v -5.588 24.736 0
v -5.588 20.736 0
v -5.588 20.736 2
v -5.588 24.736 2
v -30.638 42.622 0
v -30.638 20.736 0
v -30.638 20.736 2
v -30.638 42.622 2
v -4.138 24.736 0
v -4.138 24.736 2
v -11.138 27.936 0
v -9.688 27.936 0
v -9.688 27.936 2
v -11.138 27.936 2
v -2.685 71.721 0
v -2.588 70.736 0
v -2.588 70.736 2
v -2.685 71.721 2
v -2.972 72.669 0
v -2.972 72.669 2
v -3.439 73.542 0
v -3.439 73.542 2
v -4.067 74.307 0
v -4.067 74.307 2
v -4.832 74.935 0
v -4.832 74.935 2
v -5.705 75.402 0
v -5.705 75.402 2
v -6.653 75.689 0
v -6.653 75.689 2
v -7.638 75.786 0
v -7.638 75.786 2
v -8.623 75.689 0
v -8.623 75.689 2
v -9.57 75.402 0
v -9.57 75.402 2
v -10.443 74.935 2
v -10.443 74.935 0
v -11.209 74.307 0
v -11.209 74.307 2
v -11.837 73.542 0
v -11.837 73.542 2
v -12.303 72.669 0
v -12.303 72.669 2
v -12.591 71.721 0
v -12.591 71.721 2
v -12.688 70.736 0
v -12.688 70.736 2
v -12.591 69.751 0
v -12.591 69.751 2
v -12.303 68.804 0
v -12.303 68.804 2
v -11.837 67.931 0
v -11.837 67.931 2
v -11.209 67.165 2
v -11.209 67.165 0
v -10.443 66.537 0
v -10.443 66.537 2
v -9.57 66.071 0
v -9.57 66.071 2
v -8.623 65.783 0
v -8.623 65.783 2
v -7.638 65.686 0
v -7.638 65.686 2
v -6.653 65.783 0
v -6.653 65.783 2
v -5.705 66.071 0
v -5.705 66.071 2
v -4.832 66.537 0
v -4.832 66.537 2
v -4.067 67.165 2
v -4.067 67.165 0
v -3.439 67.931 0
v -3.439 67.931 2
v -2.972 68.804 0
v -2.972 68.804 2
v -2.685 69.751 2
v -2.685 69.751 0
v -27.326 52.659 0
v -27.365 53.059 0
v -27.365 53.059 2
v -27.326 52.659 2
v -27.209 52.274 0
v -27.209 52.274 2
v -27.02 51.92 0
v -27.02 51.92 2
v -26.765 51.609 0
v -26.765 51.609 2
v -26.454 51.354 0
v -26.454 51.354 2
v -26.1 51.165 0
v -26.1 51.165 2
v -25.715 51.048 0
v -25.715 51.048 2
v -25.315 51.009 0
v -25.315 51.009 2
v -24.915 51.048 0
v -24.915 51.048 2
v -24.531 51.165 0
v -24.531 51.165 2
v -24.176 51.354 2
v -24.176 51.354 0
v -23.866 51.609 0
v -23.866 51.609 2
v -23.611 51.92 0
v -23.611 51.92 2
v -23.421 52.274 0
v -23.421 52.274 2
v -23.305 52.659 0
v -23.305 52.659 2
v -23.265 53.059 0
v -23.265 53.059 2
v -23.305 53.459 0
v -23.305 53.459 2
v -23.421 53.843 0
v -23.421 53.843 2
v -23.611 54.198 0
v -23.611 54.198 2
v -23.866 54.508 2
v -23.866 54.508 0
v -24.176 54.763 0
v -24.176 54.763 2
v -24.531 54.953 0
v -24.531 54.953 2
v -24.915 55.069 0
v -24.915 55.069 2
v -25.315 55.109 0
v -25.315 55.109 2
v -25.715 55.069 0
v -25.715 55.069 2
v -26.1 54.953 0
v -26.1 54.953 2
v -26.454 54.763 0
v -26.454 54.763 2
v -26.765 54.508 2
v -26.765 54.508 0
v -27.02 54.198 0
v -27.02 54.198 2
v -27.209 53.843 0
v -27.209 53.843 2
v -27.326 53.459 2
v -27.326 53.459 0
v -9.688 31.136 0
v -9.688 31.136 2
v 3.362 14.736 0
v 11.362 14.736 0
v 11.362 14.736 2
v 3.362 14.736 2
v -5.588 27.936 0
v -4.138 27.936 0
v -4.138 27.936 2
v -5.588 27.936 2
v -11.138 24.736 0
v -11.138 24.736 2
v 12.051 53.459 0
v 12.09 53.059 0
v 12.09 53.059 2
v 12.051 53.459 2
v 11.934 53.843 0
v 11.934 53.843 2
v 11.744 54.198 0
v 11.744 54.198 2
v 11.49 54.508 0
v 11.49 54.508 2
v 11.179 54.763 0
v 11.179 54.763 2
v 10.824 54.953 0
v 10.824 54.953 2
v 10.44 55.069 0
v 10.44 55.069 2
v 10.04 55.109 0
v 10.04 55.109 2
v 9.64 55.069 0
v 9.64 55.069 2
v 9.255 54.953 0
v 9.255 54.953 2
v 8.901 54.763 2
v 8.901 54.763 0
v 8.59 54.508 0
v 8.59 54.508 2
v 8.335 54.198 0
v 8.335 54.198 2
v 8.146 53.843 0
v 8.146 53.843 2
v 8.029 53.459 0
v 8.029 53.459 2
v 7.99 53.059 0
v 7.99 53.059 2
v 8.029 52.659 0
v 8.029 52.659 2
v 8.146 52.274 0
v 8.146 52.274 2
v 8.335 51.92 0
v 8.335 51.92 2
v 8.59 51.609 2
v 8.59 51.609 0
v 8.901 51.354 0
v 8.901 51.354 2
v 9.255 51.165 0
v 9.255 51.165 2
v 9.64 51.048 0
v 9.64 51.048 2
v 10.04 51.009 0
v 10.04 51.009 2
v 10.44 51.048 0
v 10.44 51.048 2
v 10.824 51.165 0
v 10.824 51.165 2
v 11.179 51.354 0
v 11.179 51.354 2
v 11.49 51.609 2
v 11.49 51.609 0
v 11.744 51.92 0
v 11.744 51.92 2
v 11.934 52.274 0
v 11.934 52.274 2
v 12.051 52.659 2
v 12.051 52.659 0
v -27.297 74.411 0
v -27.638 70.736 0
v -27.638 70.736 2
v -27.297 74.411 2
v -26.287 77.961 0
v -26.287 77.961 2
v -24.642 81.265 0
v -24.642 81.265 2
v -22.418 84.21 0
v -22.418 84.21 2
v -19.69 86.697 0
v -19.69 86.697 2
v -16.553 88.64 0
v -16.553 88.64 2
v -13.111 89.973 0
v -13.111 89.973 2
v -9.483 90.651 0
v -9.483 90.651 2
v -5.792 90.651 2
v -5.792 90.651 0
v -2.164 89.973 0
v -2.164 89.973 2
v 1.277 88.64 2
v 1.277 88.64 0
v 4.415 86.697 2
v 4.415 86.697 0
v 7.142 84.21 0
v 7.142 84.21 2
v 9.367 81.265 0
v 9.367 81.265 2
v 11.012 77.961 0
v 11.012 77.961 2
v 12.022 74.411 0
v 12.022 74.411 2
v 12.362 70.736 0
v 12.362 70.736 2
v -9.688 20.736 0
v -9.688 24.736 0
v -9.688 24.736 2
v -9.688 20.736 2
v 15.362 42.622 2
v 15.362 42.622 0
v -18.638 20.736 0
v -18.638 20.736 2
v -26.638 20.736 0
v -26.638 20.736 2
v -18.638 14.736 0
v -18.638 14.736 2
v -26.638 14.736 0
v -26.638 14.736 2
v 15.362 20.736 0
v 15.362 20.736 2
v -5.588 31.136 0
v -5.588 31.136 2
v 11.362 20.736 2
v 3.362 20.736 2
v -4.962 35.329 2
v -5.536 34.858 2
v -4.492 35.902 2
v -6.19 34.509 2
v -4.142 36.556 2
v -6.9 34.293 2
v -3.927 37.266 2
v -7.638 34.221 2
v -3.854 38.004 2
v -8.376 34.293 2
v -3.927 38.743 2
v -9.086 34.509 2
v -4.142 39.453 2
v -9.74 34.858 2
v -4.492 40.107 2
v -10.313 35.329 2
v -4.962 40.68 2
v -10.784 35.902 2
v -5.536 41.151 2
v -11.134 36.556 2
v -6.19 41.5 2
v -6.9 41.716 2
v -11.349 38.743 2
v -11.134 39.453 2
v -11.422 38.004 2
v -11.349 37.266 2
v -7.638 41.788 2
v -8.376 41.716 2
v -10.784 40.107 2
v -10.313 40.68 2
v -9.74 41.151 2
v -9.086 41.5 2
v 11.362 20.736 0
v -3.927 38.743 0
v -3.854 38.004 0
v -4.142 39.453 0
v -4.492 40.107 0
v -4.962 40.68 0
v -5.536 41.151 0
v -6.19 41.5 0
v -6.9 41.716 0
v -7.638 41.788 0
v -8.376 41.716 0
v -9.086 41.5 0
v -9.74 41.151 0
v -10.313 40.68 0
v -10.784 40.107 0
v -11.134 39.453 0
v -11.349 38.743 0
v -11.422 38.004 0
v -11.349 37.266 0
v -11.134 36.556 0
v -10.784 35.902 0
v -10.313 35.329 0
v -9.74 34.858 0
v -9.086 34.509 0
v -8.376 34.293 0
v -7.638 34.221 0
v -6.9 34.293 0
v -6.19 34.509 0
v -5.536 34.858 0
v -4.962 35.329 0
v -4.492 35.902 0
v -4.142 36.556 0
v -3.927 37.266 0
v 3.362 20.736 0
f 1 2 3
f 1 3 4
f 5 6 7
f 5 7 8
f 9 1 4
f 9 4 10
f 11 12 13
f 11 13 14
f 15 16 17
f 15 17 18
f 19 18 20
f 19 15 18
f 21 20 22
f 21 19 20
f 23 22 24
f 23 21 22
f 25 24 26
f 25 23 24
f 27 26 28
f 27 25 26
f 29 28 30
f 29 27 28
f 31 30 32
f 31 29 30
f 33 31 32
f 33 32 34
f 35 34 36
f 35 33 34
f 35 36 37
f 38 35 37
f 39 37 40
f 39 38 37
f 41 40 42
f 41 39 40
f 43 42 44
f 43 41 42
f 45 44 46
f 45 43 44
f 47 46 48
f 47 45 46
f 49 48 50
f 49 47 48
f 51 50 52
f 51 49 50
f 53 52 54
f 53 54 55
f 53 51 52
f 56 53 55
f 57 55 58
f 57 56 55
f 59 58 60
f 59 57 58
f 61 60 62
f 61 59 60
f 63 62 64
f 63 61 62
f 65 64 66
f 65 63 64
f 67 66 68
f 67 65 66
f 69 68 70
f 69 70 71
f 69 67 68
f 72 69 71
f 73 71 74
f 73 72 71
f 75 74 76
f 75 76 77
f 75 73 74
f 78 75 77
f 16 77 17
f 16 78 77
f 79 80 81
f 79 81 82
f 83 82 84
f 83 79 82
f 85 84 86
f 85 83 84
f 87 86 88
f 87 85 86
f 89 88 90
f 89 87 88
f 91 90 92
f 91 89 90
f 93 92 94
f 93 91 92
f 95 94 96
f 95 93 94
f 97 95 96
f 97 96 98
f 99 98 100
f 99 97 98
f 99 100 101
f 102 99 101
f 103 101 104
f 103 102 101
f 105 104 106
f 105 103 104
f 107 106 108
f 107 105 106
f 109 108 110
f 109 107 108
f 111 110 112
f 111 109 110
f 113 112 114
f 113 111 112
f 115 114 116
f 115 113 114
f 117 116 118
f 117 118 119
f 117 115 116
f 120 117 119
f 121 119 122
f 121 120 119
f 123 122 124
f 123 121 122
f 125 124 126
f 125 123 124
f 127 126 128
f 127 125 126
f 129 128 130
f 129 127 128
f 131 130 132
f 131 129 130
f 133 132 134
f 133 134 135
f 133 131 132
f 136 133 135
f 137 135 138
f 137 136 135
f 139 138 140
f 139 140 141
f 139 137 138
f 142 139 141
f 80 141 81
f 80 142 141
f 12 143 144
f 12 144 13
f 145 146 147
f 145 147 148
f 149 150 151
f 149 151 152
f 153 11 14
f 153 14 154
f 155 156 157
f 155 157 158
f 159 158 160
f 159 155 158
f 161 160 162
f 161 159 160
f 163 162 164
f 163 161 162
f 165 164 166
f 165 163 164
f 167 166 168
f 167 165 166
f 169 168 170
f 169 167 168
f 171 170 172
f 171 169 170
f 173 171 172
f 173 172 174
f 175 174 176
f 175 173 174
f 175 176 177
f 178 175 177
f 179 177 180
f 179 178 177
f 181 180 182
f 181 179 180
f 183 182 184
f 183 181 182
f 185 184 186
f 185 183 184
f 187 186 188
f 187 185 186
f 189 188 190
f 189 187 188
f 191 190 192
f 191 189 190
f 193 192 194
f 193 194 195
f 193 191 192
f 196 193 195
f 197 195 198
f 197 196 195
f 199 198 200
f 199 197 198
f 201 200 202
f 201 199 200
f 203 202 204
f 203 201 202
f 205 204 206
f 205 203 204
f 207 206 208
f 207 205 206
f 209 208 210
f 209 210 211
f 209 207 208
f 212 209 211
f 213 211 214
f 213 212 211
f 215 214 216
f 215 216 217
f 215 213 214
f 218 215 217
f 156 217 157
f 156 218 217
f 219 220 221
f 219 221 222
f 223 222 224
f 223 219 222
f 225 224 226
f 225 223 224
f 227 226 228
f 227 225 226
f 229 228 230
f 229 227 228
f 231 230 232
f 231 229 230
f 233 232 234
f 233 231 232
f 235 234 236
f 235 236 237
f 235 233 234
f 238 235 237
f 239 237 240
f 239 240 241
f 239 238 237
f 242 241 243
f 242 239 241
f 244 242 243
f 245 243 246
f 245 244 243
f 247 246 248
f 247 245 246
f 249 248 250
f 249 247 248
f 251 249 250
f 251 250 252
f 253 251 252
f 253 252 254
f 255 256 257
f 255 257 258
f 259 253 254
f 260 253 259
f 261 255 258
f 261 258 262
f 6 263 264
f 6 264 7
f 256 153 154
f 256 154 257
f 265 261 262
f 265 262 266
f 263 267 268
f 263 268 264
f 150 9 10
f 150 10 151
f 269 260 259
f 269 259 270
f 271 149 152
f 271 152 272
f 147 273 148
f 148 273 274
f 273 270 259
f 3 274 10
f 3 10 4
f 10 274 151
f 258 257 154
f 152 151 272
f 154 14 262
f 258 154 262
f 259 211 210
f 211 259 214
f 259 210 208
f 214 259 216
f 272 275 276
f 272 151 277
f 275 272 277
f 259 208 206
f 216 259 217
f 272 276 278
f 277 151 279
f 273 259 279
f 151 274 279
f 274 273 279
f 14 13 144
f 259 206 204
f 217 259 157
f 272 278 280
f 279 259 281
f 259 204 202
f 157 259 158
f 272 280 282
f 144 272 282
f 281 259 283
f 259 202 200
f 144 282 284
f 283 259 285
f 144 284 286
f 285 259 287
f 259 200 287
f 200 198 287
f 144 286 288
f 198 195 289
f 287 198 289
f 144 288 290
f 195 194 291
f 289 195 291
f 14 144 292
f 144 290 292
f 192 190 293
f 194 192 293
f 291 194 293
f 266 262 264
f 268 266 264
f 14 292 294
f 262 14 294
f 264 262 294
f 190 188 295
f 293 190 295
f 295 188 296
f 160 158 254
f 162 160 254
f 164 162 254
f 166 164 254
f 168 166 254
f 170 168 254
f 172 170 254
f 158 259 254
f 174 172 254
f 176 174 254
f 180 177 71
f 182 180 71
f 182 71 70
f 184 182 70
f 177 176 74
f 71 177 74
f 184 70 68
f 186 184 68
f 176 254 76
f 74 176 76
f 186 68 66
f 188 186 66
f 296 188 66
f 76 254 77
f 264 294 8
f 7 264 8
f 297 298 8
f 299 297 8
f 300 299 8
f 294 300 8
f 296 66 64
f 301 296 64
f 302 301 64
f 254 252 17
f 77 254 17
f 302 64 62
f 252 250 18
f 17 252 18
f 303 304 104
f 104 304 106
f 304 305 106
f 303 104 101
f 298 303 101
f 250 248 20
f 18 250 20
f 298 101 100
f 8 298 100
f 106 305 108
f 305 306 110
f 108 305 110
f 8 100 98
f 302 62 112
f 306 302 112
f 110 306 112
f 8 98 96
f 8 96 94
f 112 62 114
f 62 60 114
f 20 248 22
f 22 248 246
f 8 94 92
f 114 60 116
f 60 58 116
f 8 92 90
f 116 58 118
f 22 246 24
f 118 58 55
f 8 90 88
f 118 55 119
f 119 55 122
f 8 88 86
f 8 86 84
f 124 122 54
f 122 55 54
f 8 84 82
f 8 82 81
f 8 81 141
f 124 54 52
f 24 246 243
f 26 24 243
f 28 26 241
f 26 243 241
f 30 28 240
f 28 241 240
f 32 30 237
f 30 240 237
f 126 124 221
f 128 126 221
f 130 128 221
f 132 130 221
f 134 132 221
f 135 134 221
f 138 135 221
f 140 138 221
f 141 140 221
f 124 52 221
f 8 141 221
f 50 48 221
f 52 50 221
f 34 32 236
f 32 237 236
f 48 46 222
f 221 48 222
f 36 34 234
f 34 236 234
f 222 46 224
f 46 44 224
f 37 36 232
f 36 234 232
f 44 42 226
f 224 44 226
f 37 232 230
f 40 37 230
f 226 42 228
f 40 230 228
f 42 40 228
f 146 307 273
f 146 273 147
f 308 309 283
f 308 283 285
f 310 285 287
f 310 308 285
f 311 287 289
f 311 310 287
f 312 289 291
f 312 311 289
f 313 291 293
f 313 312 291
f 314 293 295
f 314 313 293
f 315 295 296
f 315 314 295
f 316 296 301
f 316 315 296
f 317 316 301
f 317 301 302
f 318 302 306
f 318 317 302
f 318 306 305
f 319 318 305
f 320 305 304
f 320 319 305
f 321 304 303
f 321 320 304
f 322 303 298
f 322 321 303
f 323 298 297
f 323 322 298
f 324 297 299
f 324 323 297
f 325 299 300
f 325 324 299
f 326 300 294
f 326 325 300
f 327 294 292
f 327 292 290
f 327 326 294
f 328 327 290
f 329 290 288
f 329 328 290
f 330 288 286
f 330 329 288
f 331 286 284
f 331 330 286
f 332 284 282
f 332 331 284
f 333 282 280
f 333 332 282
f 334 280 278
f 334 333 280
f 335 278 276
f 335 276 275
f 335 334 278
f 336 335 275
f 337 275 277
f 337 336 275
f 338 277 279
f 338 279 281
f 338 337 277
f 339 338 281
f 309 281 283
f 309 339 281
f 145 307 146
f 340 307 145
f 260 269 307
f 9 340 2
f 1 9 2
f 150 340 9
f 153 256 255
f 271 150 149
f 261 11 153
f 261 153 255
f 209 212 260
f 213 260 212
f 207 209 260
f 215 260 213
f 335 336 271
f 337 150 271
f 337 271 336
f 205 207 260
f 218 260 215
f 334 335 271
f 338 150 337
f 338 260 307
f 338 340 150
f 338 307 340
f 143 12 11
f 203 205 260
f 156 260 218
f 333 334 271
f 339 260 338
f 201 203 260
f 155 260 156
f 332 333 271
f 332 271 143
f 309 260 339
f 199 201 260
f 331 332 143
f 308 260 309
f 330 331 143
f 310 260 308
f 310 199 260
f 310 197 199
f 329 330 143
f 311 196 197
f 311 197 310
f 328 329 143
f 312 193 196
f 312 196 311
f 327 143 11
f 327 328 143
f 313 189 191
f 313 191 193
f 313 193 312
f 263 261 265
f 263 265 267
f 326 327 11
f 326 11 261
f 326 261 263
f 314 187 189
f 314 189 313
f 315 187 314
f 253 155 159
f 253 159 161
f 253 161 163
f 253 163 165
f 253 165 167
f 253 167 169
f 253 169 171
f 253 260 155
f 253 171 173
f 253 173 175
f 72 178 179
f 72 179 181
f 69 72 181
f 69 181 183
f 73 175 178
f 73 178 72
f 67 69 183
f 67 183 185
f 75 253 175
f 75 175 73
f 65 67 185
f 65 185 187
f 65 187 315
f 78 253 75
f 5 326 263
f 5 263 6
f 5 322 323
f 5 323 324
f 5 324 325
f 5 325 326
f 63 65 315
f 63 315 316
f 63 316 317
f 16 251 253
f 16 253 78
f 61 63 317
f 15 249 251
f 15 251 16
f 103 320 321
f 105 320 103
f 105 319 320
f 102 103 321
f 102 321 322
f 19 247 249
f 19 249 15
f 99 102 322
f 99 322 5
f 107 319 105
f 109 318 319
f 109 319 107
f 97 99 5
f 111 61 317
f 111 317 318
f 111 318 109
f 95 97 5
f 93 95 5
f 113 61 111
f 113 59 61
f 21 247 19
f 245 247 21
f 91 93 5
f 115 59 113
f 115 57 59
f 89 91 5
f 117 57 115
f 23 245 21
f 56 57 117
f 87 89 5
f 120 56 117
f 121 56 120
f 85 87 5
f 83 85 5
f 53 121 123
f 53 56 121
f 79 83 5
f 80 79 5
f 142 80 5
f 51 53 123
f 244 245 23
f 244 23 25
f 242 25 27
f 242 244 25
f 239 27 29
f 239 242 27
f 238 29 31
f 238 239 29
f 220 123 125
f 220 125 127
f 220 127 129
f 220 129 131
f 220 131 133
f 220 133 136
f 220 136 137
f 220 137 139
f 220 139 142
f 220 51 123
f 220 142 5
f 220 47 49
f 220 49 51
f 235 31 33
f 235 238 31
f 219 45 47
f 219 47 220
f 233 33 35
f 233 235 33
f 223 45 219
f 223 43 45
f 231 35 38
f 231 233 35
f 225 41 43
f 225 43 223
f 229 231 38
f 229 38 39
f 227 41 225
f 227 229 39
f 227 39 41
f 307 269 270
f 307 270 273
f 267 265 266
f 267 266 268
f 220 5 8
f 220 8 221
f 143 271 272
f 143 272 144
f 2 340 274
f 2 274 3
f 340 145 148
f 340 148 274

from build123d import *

# Parameters (mm, degrees)
SKETCH_1_R      = 5.05
SKETCH_1_R_2    = 2.05
SKETCH_1_R_3    = 3.783876232
EXTRUDE_1_DEPTH = 2


with BuildPart() as part:
    # 草图1 → 凸台-拉伸1 (new body)
    with BuildSketch(Plane.XY):
        with BuildLine():
            Line((-5.587732913, 20.736278596), (-5.587732913, 24.736278596))
            Line((-5.587732913, 24.736278596), (-4.137732913, 24.736278596))
            Line((-4.137732913, 24.736278596), (-4.137732913, 27.936278596))
            Line((-4.137732913, 27.936278596), (-5.587732913, 27.936278596))
            Line((-5.587732913, 27.936278596), (-5.587732913, 31.136278596))
            Line((-5.587732913, 31.136278596), (-9.687732913, 31.136278596))
            Line((-9.687732913, 31.136278596), (-9.687732913, 27.936278596))
            Line((-9.687732913, 27.936278596), (-11.137732913, 27.936278596))
            Line((-11.137732913, 27.936278596), (-11.137732913, 24.736278596))
            Line((-11.137732913, 24.736278596), (-9.687732913, 24.736278596))
            Line((-9.687732913, 24.736278596), (-9.687732913, 20.736278596))
            Line((-9.687732913, 20.736278596), (-18.637732913, 20.736278596))
            Line((-18.637732913, 20.736278596), (-18.637732913, 14.736278596))
            Line((-18.637732913, 14.736278596), (-26.637732913, 14.736278596))
            Line((-26.637732913, 14.736278596), (-26.637732913, 20.736278596))
            Line((-26.637732913, 20.736278596), (-30.637732913, 20.736278596))
            Line((-30.637732913, 20.736278596), (-30.637732913, 42.62233047))
            Line((-30.637732913, 42.62233047), (-27.637732913, 70.736278596))
            ThreePointArc((-27.637732913, 70.736278596), (-7.637732913, 90.736278596), (12.362267087, 70.736278596))
            Line((12.362267087, 70.736278596), (15.362267087, 42.62233047))
            Line((15.362267087, 42.62233047), (15.362267087, 20.736278596))
            Line((15.362267087, 20.736278596), (11.362267087, 20.736278596))
            Line((11.362267087, 20.736278596), (11.362267087, 14.736278596))
            Line((11.362267087, 14.736278596), (3.362267087, 14.736278596))
            Line((3.362267087, 14.736278596), (3.362267087, 20.736278596))
            Line((3.362267087, 20.736278596), (-5.587732913, 20.736278596))
        make_face()
        with Locations((-7.637732913, 70.736278596)):
            Circle(SKETCH_1_R, mode=Mode.SUBTRACT)
        with Locations((10.039936617, 53.058609066)):
            Circle(SKETCH_1_R_2, mode=Mode.SUBTRACT)
        with Locations(Location((-25.315402443, 53.058609066, 0), (0, 0, 180))):
            Circle(SKETCH_1_R_2, mode=Mode.SUBTRACT)
        with Locations((-7.637732913, 38.004477847)):
            Circle(SKETCH_1_R_3, mode=Mode.SUBTRACT)
    extrude(amount=EXTRUDE_1_DEPTH)


solid = part.part
